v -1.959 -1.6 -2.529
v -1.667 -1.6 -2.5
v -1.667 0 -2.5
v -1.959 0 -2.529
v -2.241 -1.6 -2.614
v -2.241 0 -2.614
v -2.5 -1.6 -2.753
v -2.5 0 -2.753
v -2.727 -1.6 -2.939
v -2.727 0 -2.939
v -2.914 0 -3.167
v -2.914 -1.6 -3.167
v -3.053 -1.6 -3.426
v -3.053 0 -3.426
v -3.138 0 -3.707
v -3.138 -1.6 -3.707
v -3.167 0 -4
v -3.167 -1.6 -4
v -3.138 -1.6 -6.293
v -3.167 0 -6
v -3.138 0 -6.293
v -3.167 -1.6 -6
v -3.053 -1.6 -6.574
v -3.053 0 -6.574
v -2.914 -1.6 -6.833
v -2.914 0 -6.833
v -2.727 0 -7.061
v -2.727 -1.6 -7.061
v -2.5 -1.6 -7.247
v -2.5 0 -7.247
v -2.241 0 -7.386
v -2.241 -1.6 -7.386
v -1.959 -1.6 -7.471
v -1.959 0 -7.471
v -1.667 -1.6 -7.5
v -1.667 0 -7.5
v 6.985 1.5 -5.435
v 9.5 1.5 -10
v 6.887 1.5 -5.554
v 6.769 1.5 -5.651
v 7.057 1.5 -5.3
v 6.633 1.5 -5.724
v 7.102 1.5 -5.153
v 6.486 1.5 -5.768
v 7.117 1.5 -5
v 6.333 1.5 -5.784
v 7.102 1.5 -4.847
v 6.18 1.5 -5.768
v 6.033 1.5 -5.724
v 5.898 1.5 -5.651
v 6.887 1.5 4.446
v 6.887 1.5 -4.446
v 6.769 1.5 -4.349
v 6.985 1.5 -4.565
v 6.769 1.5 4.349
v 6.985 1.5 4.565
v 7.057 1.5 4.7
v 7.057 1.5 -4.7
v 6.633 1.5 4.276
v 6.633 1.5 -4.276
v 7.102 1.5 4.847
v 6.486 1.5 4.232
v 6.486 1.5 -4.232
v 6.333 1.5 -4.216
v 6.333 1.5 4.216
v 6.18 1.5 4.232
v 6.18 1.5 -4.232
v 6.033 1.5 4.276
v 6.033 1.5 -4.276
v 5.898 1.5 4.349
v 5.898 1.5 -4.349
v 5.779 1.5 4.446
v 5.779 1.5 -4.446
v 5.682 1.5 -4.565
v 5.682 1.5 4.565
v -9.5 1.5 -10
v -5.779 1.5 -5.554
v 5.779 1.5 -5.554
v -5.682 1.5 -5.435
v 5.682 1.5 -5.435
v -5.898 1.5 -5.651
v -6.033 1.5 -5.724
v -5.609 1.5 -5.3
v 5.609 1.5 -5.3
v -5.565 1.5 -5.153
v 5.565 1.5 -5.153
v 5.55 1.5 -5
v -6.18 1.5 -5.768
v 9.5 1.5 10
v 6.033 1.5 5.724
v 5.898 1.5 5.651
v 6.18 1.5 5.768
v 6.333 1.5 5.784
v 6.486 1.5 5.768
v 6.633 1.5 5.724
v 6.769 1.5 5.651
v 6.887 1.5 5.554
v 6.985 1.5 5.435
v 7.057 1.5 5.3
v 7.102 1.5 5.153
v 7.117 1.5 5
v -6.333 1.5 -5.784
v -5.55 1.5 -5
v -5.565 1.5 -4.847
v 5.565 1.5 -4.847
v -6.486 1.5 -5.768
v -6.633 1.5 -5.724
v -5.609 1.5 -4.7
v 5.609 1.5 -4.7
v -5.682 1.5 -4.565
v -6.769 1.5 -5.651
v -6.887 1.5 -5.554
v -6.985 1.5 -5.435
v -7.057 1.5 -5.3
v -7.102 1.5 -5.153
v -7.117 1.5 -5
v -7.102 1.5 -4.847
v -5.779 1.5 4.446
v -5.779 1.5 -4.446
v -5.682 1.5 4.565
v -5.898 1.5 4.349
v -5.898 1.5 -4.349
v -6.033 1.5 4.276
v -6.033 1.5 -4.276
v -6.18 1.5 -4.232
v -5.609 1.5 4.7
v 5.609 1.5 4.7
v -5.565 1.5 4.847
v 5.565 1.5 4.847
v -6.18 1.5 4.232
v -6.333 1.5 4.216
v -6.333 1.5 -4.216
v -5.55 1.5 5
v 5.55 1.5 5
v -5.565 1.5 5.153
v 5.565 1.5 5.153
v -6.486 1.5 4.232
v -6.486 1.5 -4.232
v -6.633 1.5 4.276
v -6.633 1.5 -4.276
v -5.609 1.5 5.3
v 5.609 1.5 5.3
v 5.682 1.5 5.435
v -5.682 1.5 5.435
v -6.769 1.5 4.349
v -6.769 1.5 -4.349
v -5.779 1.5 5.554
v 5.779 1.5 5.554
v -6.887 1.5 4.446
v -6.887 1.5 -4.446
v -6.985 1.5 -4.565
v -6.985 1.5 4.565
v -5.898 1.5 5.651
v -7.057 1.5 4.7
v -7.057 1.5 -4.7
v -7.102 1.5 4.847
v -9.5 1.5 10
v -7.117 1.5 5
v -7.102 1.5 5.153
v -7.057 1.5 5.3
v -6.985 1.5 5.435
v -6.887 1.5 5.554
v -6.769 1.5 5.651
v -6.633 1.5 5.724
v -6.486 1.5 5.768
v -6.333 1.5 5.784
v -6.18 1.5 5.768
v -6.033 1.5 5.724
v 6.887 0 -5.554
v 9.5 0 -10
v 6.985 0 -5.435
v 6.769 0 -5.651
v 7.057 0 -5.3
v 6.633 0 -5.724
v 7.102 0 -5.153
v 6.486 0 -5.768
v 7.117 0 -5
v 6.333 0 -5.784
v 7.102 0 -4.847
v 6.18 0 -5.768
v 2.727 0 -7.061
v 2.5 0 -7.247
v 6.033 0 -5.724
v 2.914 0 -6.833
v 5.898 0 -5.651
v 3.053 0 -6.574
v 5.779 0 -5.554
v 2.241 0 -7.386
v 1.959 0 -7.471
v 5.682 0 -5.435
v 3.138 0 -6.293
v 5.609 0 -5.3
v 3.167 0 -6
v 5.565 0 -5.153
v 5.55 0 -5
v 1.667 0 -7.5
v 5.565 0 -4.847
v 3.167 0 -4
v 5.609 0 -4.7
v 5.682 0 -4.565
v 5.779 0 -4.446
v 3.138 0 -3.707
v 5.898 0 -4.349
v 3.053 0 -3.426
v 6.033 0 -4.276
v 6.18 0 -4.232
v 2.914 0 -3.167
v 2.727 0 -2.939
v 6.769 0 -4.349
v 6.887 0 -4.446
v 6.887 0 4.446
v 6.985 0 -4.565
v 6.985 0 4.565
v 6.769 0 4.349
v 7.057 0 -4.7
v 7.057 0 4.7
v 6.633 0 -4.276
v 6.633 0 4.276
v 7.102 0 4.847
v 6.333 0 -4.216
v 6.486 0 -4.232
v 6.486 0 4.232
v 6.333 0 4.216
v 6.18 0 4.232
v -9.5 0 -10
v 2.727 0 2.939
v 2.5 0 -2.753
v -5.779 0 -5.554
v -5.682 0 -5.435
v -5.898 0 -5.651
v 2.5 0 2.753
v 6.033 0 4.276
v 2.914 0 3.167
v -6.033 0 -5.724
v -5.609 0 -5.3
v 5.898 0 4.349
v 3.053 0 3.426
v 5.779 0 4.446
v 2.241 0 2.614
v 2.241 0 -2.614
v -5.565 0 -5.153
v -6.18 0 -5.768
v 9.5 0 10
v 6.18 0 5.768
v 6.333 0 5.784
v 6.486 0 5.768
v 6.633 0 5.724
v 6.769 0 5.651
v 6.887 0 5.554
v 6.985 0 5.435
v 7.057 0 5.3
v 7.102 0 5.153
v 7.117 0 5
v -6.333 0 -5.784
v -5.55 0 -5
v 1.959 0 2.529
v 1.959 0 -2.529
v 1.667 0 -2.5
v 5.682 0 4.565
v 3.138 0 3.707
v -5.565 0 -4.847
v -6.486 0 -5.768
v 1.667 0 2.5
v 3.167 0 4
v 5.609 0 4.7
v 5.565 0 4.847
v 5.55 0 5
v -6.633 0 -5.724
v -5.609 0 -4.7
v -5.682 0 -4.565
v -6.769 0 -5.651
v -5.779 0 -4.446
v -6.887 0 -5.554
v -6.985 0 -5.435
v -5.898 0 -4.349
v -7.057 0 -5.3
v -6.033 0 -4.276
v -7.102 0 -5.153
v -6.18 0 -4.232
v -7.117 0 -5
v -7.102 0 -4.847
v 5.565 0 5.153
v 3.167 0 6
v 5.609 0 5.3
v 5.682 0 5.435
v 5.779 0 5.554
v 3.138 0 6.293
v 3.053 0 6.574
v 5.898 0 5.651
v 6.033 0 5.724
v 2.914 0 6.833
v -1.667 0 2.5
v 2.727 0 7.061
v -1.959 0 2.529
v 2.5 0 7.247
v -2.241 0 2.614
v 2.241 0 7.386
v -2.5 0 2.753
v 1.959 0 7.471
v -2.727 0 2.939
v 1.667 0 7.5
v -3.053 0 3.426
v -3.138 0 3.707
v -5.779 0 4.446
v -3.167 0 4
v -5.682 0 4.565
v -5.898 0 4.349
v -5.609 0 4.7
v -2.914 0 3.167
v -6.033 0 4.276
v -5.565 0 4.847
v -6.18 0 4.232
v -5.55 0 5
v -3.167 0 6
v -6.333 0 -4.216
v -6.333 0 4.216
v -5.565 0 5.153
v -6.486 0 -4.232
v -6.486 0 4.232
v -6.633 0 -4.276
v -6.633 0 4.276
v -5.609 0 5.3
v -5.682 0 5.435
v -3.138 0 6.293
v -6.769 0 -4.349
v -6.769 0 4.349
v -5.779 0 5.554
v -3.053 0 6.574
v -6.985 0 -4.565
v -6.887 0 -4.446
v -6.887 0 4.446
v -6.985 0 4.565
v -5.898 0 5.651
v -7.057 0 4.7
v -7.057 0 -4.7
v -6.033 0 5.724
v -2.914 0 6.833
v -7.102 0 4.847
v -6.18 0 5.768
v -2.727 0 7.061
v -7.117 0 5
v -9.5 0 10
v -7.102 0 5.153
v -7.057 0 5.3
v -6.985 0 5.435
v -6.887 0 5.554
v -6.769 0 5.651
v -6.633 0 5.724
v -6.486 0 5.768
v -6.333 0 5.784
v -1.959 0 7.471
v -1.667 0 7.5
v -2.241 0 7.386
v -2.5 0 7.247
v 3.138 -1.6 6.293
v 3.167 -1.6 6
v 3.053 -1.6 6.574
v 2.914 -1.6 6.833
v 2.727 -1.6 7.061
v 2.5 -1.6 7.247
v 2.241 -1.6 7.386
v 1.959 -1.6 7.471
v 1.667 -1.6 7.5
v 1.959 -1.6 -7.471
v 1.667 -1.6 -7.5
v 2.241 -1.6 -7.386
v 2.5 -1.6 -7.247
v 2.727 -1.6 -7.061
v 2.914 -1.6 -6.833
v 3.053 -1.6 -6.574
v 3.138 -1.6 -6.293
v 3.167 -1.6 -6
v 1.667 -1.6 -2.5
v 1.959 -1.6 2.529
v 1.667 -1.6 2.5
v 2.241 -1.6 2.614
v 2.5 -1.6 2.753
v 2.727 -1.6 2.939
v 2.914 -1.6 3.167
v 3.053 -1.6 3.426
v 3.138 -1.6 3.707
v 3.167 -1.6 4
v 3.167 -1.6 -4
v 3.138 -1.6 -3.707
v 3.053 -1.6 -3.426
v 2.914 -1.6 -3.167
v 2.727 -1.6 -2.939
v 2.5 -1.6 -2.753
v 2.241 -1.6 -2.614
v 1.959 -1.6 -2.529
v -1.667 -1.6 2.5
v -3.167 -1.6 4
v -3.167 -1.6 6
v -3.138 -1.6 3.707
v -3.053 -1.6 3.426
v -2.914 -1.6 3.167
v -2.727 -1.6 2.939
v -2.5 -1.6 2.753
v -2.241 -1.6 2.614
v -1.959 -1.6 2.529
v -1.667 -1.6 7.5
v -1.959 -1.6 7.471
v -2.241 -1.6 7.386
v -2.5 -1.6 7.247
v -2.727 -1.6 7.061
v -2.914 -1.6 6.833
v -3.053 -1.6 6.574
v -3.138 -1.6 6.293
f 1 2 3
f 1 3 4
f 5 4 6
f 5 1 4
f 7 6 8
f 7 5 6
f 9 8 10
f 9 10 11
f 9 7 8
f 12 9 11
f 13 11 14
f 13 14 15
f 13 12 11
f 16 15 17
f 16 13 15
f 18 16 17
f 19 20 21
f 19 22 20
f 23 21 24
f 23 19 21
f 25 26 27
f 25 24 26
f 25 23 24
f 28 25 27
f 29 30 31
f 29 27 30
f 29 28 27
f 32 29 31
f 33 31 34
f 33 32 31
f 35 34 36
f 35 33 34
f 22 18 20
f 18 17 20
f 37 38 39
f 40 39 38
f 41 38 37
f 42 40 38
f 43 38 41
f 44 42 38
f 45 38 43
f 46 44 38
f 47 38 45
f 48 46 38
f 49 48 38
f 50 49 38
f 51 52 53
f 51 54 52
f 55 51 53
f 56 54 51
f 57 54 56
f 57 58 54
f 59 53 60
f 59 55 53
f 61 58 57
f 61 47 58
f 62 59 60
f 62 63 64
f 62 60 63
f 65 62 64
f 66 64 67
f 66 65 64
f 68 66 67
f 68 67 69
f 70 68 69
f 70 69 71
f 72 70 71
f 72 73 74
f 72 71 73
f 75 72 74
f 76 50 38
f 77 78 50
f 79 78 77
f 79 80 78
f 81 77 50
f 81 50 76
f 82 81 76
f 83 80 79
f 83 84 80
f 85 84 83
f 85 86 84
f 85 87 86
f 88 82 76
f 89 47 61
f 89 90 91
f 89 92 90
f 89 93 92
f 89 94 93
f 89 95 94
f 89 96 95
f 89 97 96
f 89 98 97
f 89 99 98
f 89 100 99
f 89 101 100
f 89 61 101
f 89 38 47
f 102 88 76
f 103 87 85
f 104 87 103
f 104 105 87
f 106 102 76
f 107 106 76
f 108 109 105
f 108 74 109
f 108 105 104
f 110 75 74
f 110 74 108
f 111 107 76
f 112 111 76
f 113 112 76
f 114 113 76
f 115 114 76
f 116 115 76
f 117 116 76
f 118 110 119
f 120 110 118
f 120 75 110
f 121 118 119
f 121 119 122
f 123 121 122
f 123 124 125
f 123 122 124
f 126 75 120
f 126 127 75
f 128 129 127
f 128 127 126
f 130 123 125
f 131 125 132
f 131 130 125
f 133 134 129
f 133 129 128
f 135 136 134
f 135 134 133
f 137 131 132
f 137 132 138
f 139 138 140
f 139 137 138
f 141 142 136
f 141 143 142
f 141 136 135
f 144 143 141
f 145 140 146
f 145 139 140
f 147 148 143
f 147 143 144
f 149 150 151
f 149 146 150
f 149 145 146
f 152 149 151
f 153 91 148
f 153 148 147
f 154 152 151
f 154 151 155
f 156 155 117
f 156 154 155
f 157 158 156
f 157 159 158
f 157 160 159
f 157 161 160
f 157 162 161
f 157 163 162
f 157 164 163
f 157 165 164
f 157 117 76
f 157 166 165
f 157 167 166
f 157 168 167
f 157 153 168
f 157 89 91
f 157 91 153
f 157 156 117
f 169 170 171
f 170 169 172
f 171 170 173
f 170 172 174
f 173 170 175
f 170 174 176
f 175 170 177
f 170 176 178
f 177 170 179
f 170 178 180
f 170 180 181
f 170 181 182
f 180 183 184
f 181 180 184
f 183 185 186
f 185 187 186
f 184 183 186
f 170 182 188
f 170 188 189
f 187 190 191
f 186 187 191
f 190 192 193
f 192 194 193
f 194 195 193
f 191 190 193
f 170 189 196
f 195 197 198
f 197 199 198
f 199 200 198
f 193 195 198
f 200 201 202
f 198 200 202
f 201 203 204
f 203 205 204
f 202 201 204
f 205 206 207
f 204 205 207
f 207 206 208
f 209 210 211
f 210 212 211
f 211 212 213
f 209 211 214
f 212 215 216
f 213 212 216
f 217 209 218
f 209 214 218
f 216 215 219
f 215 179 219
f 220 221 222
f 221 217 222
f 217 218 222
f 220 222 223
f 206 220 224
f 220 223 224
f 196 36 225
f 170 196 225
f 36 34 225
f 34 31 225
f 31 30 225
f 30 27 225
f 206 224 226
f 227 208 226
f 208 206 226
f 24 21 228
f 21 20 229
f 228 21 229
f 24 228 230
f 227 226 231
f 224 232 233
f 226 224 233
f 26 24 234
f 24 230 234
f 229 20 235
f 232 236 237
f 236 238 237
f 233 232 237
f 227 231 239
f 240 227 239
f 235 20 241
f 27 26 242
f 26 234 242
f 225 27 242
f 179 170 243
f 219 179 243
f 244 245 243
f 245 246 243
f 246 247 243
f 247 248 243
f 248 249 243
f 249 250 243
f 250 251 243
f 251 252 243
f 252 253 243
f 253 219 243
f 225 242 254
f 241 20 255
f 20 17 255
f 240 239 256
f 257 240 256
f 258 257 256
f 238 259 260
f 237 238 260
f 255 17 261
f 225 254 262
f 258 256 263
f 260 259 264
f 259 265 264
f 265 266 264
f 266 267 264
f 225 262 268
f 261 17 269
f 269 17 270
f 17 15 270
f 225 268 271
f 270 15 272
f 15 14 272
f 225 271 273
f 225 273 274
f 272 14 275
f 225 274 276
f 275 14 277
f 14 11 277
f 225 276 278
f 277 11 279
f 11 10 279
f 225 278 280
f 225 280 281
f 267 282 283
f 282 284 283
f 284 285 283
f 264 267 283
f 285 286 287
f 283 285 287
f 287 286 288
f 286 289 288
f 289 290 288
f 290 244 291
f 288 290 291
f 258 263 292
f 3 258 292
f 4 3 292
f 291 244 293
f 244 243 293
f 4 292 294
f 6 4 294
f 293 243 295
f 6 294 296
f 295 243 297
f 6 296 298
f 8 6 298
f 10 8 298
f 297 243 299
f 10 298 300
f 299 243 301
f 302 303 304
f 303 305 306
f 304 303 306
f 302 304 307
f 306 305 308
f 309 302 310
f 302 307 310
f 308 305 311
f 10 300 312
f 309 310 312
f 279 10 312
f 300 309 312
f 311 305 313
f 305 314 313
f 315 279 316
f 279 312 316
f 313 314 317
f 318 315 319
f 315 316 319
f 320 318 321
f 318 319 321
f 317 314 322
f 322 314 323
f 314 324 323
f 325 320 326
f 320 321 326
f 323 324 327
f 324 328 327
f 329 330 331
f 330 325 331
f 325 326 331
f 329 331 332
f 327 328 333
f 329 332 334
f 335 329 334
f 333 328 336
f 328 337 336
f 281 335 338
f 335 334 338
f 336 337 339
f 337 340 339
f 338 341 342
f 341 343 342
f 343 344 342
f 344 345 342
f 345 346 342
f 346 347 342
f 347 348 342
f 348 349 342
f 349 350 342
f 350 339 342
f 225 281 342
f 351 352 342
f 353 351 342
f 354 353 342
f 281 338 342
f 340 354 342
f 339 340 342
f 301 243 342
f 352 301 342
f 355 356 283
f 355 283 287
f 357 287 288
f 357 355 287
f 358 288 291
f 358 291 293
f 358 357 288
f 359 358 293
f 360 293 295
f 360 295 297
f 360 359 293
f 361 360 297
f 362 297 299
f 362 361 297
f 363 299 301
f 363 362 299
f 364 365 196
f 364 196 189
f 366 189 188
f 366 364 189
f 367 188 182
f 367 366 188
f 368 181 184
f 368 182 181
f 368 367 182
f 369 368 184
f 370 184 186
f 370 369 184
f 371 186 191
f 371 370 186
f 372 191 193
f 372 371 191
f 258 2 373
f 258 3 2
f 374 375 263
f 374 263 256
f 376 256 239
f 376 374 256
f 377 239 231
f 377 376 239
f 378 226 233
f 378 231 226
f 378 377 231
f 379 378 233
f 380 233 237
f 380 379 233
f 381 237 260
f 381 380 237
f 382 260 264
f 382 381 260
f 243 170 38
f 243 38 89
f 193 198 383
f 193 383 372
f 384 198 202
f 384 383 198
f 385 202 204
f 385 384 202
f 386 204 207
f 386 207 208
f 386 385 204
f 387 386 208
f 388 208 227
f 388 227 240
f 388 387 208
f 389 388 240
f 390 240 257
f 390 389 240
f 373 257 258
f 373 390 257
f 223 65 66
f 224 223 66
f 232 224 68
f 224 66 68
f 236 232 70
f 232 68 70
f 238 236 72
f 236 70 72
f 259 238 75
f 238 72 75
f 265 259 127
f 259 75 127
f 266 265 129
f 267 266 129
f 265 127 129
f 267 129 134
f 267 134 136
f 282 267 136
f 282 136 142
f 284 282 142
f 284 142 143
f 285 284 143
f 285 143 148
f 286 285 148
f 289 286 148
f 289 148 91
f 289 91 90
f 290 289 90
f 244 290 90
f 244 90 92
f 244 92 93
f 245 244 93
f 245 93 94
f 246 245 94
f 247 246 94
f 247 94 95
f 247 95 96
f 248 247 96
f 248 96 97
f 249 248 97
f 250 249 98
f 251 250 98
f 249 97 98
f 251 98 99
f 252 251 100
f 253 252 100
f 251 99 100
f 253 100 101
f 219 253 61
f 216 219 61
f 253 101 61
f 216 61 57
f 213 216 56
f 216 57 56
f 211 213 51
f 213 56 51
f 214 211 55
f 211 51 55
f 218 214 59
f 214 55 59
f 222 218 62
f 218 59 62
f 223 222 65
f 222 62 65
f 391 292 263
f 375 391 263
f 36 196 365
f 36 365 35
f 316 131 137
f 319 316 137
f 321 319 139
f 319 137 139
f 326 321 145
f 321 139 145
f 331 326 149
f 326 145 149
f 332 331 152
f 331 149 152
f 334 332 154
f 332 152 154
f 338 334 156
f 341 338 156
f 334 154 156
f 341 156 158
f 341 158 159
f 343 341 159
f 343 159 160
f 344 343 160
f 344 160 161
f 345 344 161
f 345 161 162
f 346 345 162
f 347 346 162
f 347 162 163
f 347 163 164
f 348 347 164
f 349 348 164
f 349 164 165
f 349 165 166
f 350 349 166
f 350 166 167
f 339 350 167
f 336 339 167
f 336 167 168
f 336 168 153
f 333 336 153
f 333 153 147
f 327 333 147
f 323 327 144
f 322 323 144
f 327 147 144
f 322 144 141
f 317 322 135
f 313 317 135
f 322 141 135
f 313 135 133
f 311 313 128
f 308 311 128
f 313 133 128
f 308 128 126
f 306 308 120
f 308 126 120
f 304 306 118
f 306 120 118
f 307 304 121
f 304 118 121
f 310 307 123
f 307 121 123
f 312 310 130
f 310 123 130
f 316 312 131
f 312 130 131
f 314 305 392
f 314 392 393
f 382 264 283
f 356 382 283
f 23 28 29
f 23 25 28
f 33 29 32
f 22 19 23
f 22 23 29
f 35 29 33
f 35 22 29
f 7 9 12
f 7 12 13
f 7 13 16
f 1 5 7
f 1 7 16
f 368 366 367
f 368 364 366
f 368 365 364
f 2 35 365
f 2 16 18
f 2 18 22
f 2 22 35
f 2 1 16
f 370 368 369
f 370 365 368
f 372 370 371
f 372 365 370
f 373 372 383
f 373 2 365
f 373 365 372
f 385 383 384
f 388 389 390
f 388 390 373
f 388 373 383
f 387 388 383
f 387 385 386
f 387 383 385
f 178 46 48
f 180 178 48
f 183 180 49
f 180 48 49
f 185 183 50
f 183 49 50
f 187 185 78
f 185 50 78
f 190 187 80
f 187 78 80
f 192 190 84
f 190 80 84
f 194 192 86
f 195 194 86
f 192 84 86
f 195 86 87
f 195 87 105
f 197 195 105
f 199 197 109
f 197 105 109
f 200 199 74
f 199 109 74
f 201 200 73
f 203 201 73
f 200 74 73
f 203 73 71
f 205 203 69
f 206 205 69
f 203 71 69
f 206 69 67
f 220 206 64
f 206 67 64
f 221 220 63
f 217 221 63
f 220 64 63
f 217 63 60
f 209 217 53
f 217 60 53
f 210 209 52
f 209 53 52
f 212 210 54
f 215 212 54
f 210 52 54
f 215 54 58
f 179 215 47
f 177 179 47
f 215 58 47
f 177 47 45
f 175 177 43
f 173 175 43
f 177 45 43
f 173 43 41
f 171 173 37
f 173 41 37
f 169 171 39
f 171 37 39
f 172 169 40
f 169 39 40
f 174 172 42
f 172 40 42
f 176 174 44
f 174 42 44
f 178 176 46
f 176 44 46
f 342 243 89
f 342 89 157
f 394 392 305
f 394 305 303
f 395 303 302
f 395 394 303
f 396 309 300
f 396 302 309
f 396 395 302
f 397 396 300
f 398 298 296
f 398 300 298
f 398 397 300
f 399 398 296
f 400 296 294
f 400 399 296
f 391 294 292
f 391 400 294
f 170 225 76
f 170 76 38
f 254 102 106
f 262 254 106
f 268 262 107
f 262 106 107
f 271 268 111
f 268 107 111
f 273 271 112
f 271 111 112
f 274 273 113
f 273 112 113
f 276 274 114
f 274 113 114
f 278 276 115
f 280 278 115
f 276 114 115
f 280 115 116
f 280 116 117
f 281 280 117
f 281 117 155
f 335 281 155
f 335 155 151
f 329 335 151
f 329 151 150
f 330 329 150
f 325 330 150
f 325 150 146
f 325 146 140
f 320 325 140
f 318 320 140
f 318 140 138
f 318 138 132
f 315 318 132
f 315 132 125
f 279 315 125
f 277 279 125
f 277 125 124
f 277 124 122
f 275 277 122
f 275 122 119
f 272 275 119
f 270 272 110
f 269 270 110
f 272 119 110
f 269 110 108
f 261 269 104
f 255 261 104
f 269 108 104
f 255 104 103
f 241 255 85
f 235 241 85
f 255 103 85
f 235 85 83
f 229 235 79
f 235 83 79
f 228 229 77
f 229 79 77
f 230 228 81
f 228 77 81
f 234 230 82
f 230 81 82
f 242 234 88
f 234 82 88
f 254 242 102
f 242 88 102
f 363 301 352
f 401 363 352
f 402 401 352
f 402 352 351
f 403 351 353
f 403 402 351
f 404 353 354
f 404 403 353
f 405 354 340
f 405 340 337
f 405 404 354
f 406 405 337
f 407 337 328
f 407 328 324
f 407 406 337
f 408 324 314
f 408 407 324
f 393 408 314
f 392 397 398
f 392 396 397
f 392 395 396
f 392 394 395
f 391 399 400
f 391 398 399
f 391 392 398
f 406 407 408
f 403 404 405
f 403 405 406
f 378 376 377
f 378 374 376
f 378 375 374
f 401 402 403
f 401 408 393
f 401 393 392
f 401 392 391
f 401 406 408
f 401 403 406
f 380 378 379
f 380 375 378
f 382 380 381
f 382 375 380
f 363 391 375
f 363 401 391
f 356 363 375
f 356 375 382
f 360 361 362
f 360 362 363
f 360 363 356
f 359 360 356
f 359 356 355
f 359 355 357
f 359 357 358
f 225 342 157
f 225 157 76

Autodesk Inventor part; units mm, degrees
ref_plane "YZ Plane" through (0, 0, 0) normal (1, 0, 0) x (0, 1, 0)
ref_plane "XZ Plane" through (0, 0, 0) normal (0, 1, 0) x (-1, 0, 0)
ref_plane "XY Plane" through (0, 0, 0) normal (0, 0, 1) x (1, 0, 0)
sketch "スケッチ1" plane through (0, 0, 0) normal (0, 1, 0) x (-1, 0, 0)
  line L0 (9.5, -10) -> (-9.5, -10)
  line L1 (-9.5, -10) -> (-9.5, 10)
  line L2 (-9.5, 10) -> (9.5, 10)
  line L3 (9.5, 10) -> (9.5, -10)
  line L4 (9.5, -10) -> (-9.5, 10) construction
  point P0 (0, 0)
  point P1 (0, 0)
  dimension "d0" = 19
  dimension "d1" = 20
extrude "押し出し1" add sketch "スケッチ1" along normal blind 1.5
sketch "スケッチ3" plane through (0, 0, 0) normal (0, -1, 0) x (1, 0, 0)
  line L0 (-9.5, 10) -> (9.5, 10) projected
  line L1 (-9.5, -10) -> (-9.5, 10) projected
  line L2 (9.5, -10) -> (-9.5, -10) projected
  line L3 (9.5, 10) -> (9.5, -10) projected
  line L4 (-9.5, 0) -> (9.5, 0)
  line L5 (-9.5, 10) -> (9.5, 10) projected
  line L6 (0, 10) -> (0, -10)
  line L7 (0, 2.5) -> (-3.1667, 2.5)
  line L8 (-3.1667, 2.5) -> (-3.1667, 7.5)
  line L9 (-3.1667, 7.5) -> (0, 7.5)
  line L10 (0, 2.5) -> (3.1667, 2.5)
  line L11 (3.1667, 2.5) -> (3.1667, 7.5)
  line L12 (3.1667, 7.5) -> (0, 7.5)
  line L13 (0, -2.5) -> (-3.1667, -2.5)
  line L14 (-3.1667, -2.5) -> (-3.1667, -7.5)
  line L15 (-3.1667, -7.5) -> (0, -7.5)
  line L16 (3.1667, -2.5) -> (3.1667, -7.5)
  line L17 (0, -2.5) -> (3.1667, -2.5)
  line L18 (3.1667, -7.5) -> (0, -7.5)
  point P0 (0, 0)
  point P1 (0, 0)
  dimension "d8" = 3.1667
  dimension "d9" = 2.5
  dimension "d10" = 5
extrude "押し出し2" add sketch "スケッチ3" along normal blind 1.6 contours L12 L11 L10 L6 | L6 L7 L8 L9 | L17 L16 L18 L6 | L6 L15 L14 L13
sketch "スケッチ4" plane through (0, -1.6, 0) normal (0, -1, 0) x (1, 0, 0)
  line L0 (3.1667, 2.5) -> (3.1667, 7.5) projected
  line L1 (-3.1667, 7.5) -> (-3.1667, 2.5) projected
  line L2 (-3.1667, -2.5) -> (-3.1667, -7.5) projected
  line L3 (3.1667, -7.5) -> (3.1667, -2.5) projected
  line L4 (3.1667, 7.5) -> (3.1667, 2.5) construction
  line L5 (3.1667, 5) -> (6.3333, 5) construction
  line L6 (6.3333, 5) -> (9.5, 5) construction
  line L7 (9.5, 10) -> (9.5, -10) construction
  line L8 (9.5, 0) -> (-9.5, 0)
  line L9 (-9.5, -10) -> (-9.5, 10) projected
  line L10 (3.1667, 2.5) -> (-3.1667, 2.5) projected
  line L11 (0, 2.5) -> (0, -2.5)
  point P0 (0, 0)
  point P1 (6.3333, -5)
  point P2 (-6.3333, 5)
  point P3 (-6.3333, -5)
hole "穴1" at (6.3333, -1.6, 5) at (6.3333, -1.6, -5) at (-6.3333, -1.6, 5) at (-6.3333, -1.6, -5) direction (0, 1, 0) diameter 1.567 end through all thread size "M2x0.4" class "6H" standard "ISO Metric profile"
fillet "フィレット1" radius 1.5 8 edges at (3.1667, -0.8, 2.5) (3.1667, -0.8, 7.5) (-3.1667, -0.8, 7.5) (-3.1667, -0.8, 2.5) (3.1667, -0.8, -2.5) (3.1667, -0.8, -7.5) (-3.1667, -0.8, -7.5) (-3.1667, -0.8, -2.5)
properties part number "jump" material "ABS プラスチック"
